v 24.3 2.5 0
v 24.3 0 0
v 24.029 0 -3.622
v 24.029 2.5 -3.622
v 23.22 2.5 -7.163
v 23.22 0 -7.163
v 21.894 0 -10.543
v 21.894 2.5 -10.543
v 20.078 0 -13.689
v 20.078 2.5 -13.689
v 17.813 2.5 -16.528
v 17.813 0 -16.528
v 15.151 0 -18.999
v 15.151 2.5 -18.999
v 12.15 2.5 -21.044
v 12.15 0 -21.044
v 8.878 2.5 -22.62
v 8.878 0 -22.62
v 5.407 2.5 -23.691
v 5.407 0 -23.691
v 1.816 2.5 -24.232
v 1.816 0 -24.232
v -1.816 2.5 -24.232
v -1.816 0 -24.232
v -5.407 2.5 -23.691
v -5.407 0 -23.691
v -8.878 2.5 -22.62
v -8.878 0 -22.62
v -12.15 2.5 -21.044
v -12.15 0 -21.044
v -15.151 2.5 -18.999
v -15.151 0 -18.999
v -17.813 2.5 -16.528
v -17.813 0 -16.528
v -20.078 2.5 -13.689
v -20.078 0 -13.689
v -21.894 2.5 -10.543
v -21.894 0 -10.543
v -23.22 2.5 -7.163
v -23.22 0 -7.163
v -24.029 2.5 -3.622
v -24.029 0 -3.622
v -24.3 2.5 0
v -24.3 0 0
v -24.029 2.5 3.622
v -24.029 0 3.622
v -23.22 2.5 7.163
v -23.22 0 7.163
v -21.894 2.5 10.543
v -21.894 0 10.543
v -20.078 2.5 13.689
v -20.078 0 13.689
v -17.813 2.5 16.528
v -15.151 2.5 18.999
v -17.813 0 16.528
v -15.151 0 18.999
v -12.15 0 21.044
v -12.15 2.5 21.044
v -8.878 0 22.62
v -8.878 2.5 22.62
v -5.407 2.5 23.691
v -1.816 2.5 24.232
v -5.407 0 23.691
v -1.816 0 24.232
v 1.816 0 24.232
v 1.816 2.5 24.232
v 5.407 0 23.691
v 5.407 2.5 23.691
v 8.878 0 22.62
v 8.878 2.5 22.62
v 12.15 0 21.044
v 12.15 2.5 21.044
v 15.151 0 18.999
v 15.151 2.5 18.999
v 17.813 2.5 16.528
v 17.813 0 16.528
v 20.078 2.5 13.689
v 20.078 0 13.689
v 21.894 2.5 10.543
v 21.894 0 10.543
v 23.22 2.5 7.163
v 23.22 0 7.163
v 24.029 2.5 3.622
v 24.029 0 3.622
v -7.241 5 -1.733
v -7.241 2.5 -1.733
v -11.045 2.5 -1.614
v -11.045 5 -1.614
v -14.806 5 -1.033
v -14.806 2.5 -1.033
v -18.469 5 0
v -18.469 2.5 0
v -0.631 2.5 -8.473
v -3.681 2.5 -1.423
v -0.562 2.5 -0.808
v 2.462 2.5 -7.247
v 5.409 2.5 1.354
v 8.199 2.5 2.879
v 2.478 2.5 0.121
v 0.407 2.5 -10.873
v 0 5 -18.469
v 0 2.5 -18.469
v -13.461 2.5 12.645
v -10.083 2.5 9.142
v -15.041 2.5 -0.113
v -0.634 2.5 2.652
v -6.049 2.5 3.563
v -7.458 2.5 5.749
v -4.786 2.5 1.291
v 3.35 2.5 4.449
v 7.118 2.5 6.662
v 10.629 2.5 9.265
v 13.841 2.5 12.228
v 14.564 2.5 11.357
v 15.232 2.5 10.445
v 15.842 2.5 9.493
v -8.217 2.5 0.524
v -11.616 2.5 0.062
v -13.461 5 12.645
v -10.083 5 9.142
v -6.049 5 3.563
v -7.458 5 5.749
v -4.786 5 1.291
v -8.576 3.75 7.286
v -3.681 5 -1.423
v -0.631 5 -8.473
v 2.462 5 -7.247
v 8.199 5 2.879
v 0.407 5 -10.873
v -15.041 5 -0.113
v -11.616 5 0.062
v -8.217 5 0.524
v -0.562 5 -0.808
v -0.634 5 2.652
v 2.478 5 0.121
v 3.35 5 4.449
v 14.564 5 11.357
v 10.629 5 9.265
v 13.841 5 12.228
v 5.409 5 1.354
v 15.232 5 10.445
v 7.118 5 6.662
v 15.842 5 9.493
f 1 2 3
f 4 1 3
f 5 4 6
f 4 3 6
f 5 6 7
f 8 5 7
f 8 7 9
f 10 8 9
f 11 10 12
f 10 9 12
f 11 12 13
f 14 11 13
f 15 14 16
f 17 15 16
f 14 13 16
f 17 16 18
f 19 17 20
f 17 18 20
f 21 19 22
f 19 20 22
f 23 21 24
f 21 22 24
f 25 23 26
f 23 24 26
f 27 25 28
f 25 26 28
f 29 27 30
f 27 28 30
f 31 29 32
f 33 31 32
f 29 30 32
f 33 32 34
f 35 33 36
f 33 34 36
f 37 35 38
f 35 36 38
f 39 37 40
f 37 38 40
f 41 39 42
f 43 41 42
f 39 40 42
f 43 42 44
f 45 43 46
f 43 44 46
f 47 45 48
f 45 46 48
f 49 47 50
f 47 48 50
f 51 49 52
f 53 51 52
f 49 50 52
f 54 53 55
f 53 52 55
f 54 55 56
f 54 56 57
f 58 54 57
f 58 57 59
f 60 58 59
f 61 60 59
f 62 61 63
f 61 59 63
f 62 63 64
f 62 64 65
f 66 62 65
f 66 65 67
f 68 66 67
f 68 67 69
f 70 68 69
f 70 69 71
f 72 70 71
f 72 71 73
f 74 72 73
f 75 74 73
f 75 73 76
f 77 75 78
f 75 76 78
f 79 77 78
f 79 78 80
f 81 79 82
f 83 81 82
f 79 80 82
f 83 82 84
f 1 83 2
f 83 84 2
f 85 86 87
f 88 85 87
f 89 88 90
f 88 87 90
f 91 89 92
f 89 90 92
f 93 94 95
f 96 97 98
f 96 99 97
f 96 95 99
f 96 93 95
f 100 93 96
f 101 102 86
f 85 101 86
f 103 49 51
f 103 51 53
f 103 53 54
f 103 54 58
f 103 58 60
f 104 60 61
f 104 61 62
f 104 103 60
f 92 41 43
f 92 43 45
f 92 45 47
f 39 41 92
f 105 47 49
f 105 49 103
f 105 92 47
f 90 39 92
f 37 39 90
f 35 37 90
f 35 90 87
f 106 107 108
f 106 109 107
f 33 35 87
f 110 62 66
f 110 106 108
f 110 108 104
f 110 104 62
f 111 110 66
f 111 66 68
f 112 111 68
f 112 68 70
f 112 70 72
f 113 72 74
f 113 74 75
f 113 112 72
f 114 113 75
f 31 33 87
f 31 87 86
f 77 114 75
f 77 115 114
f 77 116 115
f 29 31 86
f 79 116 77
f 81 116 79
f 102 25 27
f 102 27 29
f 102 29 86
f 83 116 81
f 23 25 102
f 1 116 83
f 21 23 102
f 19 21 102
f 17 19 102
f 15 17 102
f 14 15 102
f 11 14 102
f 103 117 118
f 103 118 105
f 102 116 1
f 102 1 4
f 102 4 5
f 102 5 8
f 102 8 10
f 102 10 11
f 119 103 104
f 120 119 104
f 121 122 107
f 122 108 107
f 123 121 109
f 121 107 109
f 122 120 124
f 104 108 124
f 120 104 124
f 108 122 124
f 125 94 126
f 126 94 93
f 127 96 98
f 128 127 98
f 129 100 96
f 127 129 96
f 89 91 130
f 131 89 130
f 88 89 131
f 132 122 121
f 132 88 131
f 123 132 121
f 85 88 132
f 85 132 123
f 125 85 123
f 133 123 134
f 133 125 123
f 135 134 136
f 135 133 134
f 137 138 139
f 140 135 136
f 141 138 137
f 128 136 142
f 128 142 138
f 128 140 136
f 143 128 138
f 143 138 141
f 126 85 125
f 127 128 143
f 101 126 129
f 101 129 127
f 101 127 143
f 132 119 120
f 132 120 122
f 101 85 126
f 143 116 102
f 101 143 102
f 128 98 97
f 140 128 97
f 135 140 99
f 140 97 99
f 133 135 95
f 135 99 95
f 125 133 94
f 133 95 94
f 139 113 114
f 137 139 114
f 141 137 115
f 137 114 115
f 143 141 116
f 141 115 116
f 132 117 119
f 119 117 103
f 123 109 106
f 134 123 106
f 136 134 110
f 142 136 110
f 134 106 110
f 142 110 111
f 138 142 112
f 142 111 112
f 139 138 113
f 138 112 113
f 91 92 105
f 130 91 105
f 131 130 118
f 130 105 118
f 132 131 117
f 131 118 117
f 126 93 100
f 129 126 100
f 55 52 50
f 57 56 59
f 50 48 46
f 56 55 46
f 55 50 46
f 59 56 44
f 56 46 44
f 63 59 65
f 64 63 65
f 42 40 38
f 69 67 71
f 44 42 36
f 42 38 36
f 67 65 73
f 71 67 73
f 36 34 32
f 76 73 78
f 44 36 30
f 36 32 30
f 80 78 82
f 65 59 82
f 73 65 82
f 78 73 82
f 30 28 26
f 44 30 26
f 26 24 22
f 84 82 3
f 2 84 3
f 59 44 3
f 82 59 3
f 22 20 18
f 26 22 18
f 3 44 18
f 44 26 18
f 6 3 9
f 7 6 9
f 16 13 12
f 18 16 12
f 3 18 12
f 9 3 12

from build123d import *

# Parameters (mm, degrees)
SKETCH1_R           = 24.3
BOSS_EXTRUDE1_DEPTH = 2.5
BOSS_EXTRUDE3_DEPTH = 2.5


with BuildPart() as part:
    # Sketch1 → Boss-Extrude1 (new body)
    with BuildSketch(Plane(origin=(0, 0, 0), x_dir=(1, 0, 0), z_dir=(0, 1, 0))):
        Circle(SKETCH1_R)
    extrude(amount=BOSS_EXTRUDE1_DEPTH)

    # Sketch2 → Boss-Extrude3 (add)
    with BuildSketch(Plane(origin=(0, 2.5, 0), x_dir=(1, 0, 0), z_dir=(0, 1, 0))):
        with BuildLine():
            Line((-8.217088494, -0.523578651), (-13.461313625, -12.64466032))
            add(Edge.make_bspline(
                [(-13.461313625, -12.64466032), (-8.027902846, -7.603076106), (-4.786374516, -1.291203376)],
                knots=[0, 0, 0, 0.698779306, 0.698779306, 0.698779306], degree=2))
            ThreePointArc((-4.786374516, -1.291203376), (5.263745038, -5.505270352), (13.84122859, -12.227624065))
            ThreePointArc((13.84122859, -12.227624065), (14.904706404, -10.90615084), (15.842456672, -9.492679587))
            Line((15.842456672, -9.492679587), (0, 18.468741136))
            Line((0, 18.468741136), (-7.240743071, 1.733067912))
            ThreePointArc((-7.240743071, 1.733067912), (-12.934133358, 1.380884752), (-18.468741136, 0))
            ThreePointArc((-18.468741136, 0), (-13.32639579, 0.061652646), (-8.217088494, -0.523578651))
        make_face()
        with BuildLine():
            ThreePointArc((8.198670855, -2.878510194), (2.478425995, -0.121109089), (-3.681028203, 1.423425177))
            Line((-3.681028203, 1.423425177), (-0.630983691, 8.473053617))
            Line((-0.630983691, 8.473053617), (0.407335967, 10.872942458))
            Line((0.407335967, 10.872942458), (2.461520314, 7.247373901))
            Line((2.461520314, 7.247373901), (8.198670855, -2.878510194))
        make_face(mode=Mode.SUBTRACT)
    extrude(amount=BOSS_EXTRUDE3_DEPTH)


solid = part.part
